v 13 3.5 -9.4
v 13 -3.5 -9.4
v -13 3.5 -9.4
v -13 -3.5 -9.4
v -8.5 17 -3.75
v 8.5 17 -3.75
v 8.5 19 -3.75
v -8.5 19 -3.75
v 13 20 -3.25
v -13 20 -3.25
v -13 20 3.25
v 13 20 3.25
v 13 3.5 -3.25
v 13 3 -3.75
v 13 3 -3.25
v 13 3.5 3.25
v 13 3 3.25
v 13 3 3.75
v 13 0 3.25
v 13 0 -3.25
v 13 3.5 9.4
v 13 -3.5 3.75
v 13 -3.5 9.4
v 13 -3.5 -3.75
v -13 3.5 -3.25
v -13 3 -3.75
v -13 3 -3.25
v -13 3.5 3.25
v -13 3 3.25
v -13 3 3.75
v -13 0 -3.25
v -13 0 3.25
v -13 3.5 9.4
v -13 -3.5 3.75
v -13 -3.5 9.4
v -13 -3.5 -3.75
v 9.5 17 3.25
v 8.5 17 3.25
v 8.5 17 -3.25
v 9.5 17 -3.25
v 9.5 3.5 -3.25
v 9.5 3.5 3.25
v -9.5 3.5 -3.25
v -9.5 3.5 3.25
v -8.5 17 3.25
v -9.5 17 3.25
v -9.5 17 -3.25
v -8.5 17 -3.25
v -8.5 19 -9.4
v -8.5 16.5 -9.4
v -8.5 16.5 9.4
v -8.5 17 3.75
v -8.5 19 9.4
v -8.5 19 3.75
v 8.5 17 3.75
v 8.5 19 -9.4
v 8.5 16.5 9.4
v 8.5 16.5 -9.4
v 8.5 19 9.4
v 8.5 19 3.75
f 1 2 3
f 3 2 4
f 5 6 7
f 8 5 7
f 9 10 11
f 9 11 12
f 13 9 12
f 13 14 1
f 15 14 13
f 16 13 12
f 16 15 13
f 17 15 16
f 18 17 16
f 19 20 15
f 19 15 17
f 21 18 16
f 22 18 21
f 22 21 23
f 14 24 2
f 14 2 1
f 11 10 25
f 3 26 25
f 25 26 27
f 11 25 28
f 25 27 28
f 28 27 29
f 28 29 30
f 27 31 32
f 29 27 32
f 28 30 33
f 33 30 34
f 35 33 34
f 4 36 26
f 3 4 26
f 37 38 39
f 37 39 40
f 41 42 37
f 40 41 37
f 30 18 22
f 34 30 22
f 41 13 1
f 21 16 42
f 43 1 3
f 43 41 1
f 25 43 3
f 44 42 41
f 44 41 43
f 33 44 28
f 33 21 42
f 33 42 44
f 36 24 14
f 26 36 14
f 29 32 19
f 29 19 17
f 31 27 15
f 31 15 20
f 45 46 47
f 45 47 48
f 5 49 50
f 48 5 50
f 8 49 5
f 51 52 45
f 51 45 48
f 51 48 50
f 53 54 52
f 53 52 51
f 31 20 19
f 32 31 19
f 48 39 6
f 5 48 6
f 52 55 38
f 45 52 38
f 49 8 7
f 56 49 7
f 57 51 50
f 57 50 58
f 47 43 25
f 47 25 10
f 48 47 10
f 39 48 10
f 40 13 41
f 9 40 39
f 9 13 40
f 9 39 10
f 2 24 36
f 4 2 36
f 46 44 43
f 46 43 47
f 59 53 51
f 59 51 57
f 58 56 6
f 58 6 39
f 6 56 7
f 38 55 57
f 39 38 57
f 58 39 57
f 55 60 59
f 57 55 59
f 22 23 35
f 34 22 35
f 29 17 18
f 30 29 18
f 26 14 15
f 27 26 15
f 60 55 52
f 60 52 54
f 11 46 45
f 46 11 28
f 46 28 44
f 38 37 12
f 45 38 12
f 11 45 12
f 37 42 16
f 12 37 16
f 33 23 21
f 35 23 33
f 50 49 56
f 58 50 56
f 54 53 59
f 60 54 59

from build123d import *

# Parameters (mm, degrees)
SKETCH_2_W           = 26
SKETCH_2_H           = 6.5
EXTRUDE_1_DEPTH      = 20
SKETCH_3_W           = 19
SKETCH_3_H           = 14
CUT_EXTRUDE_2_DEPTH  = 25.72347063
EXTRUDE_3_DEPTH      = 0.5
EXTRUDE_3_DEPTH_BACK = 2
SKETCH_4_W           = 17
SKETCH_4_H           = 18.8
SKETCH_5_W           = 0.5
SKETCH_5_H           = 2
CUT_EXTRUDE_4_DEPTH  = 31.831963934
EXTRUDE_7_DEPTH      = 0.5
EXTRUDE_7_DEPTH_BACK = 6.5
SKETCH_6_W           = 26
SKETCH_6_H           = 18.8
CUT_EXTRUDE_8_DEPTH  = 35.122719704


with BuildPart() as part:
    # Эскиз2 → Вытянуть1 (new body)
    with BuildSketch(Plane(origin=(0, 0, 0), x_dir=(1, 0, 0), z_dir=(0, 1, 0))):
        Rectangle(SKETCH_2_W, SKETCH_2_H)
    extrude(amount=EXTRUDE_1_DEPTH)

    # Эскиз3 → Вытянуть2 (cut, through all)
    with BuildSketch(Plane.XY.offset(3.25)):
        with Locations((0, 10)):
            Rectangle(SKETCH_3_W, SKETCH_3_H)
    extrude(amount=-CUT_EXTRUDE_2_DEPTH, mode=Mode.SUBTRACT)

    # Эскиз4 → Вытянуть3 (add, two sides: drawn at the far end of the back side and taken through both)
    with BuildSketch(Plane.XZ.offset(-17).offset(-EXTRUDE_3_DEPTH_BACK)):
        Rectangle(SKETCH_4_W, SKETCH_4_H)
    extrude(amount=EXTRUDE_3_DEPTH + EXTRUDE_3_DEPTH_BACK)

    # Эскиз5 → Вытянуть4 (cut, through all)
    with BuildSketch(Plane(origin=(8.5, 0, 0), x_dir=(0, 0, -1), z_dir=(1, 0, 0))):
        with Locations((-3.5, 18)):
            Rectangle(SKETCH_5_W, SKETCH_5_H)
        with Locations((3.5, 18)):
            Rectangle(SKETCH_5_W, SKETCH_5_H)
    extrude(amount=-CUT_EXTRUDE_4_DEPTH, mode=Mode.SUBTRACT)

    # Эскиз6 → Вытянуть7 (add, two sides: drawn at the far end of the back side and taken through both)
    with BuildSketch(Plane(origin=(0, 3, 0), x_dir=(-1, 0, 0), z_dir=(0, 1, 0)).offset(-EXTRUDE_7_DEPTH_BACK)):
        Rectangle(SKETCH_6_W, SKETCH_6_H)
    extrude(amount=EXTRUDE_7_DEPTH + EXTRUDE_7_DEPTH_BACK)

    # Эскиз9 → Вытянуть8 (cut, through all)
    with BuildSketch(Plane(origin=(13, 0, 0), x_dir=(0, 0, -1), z_dir=(1, 0, 0))):
        Polygon((-3.25, 0), (-3.25, 3), (-3.75, 3), (-3.75, -3.5), (3.75, -3.5), (3.75, 3), (3.25, 3), (3.25, 0), align=None)
    extrude(amount=-CUT_EXTRUDE_8_DEPTH, mode=Mode.SUBTRACT)


solid = part.part
